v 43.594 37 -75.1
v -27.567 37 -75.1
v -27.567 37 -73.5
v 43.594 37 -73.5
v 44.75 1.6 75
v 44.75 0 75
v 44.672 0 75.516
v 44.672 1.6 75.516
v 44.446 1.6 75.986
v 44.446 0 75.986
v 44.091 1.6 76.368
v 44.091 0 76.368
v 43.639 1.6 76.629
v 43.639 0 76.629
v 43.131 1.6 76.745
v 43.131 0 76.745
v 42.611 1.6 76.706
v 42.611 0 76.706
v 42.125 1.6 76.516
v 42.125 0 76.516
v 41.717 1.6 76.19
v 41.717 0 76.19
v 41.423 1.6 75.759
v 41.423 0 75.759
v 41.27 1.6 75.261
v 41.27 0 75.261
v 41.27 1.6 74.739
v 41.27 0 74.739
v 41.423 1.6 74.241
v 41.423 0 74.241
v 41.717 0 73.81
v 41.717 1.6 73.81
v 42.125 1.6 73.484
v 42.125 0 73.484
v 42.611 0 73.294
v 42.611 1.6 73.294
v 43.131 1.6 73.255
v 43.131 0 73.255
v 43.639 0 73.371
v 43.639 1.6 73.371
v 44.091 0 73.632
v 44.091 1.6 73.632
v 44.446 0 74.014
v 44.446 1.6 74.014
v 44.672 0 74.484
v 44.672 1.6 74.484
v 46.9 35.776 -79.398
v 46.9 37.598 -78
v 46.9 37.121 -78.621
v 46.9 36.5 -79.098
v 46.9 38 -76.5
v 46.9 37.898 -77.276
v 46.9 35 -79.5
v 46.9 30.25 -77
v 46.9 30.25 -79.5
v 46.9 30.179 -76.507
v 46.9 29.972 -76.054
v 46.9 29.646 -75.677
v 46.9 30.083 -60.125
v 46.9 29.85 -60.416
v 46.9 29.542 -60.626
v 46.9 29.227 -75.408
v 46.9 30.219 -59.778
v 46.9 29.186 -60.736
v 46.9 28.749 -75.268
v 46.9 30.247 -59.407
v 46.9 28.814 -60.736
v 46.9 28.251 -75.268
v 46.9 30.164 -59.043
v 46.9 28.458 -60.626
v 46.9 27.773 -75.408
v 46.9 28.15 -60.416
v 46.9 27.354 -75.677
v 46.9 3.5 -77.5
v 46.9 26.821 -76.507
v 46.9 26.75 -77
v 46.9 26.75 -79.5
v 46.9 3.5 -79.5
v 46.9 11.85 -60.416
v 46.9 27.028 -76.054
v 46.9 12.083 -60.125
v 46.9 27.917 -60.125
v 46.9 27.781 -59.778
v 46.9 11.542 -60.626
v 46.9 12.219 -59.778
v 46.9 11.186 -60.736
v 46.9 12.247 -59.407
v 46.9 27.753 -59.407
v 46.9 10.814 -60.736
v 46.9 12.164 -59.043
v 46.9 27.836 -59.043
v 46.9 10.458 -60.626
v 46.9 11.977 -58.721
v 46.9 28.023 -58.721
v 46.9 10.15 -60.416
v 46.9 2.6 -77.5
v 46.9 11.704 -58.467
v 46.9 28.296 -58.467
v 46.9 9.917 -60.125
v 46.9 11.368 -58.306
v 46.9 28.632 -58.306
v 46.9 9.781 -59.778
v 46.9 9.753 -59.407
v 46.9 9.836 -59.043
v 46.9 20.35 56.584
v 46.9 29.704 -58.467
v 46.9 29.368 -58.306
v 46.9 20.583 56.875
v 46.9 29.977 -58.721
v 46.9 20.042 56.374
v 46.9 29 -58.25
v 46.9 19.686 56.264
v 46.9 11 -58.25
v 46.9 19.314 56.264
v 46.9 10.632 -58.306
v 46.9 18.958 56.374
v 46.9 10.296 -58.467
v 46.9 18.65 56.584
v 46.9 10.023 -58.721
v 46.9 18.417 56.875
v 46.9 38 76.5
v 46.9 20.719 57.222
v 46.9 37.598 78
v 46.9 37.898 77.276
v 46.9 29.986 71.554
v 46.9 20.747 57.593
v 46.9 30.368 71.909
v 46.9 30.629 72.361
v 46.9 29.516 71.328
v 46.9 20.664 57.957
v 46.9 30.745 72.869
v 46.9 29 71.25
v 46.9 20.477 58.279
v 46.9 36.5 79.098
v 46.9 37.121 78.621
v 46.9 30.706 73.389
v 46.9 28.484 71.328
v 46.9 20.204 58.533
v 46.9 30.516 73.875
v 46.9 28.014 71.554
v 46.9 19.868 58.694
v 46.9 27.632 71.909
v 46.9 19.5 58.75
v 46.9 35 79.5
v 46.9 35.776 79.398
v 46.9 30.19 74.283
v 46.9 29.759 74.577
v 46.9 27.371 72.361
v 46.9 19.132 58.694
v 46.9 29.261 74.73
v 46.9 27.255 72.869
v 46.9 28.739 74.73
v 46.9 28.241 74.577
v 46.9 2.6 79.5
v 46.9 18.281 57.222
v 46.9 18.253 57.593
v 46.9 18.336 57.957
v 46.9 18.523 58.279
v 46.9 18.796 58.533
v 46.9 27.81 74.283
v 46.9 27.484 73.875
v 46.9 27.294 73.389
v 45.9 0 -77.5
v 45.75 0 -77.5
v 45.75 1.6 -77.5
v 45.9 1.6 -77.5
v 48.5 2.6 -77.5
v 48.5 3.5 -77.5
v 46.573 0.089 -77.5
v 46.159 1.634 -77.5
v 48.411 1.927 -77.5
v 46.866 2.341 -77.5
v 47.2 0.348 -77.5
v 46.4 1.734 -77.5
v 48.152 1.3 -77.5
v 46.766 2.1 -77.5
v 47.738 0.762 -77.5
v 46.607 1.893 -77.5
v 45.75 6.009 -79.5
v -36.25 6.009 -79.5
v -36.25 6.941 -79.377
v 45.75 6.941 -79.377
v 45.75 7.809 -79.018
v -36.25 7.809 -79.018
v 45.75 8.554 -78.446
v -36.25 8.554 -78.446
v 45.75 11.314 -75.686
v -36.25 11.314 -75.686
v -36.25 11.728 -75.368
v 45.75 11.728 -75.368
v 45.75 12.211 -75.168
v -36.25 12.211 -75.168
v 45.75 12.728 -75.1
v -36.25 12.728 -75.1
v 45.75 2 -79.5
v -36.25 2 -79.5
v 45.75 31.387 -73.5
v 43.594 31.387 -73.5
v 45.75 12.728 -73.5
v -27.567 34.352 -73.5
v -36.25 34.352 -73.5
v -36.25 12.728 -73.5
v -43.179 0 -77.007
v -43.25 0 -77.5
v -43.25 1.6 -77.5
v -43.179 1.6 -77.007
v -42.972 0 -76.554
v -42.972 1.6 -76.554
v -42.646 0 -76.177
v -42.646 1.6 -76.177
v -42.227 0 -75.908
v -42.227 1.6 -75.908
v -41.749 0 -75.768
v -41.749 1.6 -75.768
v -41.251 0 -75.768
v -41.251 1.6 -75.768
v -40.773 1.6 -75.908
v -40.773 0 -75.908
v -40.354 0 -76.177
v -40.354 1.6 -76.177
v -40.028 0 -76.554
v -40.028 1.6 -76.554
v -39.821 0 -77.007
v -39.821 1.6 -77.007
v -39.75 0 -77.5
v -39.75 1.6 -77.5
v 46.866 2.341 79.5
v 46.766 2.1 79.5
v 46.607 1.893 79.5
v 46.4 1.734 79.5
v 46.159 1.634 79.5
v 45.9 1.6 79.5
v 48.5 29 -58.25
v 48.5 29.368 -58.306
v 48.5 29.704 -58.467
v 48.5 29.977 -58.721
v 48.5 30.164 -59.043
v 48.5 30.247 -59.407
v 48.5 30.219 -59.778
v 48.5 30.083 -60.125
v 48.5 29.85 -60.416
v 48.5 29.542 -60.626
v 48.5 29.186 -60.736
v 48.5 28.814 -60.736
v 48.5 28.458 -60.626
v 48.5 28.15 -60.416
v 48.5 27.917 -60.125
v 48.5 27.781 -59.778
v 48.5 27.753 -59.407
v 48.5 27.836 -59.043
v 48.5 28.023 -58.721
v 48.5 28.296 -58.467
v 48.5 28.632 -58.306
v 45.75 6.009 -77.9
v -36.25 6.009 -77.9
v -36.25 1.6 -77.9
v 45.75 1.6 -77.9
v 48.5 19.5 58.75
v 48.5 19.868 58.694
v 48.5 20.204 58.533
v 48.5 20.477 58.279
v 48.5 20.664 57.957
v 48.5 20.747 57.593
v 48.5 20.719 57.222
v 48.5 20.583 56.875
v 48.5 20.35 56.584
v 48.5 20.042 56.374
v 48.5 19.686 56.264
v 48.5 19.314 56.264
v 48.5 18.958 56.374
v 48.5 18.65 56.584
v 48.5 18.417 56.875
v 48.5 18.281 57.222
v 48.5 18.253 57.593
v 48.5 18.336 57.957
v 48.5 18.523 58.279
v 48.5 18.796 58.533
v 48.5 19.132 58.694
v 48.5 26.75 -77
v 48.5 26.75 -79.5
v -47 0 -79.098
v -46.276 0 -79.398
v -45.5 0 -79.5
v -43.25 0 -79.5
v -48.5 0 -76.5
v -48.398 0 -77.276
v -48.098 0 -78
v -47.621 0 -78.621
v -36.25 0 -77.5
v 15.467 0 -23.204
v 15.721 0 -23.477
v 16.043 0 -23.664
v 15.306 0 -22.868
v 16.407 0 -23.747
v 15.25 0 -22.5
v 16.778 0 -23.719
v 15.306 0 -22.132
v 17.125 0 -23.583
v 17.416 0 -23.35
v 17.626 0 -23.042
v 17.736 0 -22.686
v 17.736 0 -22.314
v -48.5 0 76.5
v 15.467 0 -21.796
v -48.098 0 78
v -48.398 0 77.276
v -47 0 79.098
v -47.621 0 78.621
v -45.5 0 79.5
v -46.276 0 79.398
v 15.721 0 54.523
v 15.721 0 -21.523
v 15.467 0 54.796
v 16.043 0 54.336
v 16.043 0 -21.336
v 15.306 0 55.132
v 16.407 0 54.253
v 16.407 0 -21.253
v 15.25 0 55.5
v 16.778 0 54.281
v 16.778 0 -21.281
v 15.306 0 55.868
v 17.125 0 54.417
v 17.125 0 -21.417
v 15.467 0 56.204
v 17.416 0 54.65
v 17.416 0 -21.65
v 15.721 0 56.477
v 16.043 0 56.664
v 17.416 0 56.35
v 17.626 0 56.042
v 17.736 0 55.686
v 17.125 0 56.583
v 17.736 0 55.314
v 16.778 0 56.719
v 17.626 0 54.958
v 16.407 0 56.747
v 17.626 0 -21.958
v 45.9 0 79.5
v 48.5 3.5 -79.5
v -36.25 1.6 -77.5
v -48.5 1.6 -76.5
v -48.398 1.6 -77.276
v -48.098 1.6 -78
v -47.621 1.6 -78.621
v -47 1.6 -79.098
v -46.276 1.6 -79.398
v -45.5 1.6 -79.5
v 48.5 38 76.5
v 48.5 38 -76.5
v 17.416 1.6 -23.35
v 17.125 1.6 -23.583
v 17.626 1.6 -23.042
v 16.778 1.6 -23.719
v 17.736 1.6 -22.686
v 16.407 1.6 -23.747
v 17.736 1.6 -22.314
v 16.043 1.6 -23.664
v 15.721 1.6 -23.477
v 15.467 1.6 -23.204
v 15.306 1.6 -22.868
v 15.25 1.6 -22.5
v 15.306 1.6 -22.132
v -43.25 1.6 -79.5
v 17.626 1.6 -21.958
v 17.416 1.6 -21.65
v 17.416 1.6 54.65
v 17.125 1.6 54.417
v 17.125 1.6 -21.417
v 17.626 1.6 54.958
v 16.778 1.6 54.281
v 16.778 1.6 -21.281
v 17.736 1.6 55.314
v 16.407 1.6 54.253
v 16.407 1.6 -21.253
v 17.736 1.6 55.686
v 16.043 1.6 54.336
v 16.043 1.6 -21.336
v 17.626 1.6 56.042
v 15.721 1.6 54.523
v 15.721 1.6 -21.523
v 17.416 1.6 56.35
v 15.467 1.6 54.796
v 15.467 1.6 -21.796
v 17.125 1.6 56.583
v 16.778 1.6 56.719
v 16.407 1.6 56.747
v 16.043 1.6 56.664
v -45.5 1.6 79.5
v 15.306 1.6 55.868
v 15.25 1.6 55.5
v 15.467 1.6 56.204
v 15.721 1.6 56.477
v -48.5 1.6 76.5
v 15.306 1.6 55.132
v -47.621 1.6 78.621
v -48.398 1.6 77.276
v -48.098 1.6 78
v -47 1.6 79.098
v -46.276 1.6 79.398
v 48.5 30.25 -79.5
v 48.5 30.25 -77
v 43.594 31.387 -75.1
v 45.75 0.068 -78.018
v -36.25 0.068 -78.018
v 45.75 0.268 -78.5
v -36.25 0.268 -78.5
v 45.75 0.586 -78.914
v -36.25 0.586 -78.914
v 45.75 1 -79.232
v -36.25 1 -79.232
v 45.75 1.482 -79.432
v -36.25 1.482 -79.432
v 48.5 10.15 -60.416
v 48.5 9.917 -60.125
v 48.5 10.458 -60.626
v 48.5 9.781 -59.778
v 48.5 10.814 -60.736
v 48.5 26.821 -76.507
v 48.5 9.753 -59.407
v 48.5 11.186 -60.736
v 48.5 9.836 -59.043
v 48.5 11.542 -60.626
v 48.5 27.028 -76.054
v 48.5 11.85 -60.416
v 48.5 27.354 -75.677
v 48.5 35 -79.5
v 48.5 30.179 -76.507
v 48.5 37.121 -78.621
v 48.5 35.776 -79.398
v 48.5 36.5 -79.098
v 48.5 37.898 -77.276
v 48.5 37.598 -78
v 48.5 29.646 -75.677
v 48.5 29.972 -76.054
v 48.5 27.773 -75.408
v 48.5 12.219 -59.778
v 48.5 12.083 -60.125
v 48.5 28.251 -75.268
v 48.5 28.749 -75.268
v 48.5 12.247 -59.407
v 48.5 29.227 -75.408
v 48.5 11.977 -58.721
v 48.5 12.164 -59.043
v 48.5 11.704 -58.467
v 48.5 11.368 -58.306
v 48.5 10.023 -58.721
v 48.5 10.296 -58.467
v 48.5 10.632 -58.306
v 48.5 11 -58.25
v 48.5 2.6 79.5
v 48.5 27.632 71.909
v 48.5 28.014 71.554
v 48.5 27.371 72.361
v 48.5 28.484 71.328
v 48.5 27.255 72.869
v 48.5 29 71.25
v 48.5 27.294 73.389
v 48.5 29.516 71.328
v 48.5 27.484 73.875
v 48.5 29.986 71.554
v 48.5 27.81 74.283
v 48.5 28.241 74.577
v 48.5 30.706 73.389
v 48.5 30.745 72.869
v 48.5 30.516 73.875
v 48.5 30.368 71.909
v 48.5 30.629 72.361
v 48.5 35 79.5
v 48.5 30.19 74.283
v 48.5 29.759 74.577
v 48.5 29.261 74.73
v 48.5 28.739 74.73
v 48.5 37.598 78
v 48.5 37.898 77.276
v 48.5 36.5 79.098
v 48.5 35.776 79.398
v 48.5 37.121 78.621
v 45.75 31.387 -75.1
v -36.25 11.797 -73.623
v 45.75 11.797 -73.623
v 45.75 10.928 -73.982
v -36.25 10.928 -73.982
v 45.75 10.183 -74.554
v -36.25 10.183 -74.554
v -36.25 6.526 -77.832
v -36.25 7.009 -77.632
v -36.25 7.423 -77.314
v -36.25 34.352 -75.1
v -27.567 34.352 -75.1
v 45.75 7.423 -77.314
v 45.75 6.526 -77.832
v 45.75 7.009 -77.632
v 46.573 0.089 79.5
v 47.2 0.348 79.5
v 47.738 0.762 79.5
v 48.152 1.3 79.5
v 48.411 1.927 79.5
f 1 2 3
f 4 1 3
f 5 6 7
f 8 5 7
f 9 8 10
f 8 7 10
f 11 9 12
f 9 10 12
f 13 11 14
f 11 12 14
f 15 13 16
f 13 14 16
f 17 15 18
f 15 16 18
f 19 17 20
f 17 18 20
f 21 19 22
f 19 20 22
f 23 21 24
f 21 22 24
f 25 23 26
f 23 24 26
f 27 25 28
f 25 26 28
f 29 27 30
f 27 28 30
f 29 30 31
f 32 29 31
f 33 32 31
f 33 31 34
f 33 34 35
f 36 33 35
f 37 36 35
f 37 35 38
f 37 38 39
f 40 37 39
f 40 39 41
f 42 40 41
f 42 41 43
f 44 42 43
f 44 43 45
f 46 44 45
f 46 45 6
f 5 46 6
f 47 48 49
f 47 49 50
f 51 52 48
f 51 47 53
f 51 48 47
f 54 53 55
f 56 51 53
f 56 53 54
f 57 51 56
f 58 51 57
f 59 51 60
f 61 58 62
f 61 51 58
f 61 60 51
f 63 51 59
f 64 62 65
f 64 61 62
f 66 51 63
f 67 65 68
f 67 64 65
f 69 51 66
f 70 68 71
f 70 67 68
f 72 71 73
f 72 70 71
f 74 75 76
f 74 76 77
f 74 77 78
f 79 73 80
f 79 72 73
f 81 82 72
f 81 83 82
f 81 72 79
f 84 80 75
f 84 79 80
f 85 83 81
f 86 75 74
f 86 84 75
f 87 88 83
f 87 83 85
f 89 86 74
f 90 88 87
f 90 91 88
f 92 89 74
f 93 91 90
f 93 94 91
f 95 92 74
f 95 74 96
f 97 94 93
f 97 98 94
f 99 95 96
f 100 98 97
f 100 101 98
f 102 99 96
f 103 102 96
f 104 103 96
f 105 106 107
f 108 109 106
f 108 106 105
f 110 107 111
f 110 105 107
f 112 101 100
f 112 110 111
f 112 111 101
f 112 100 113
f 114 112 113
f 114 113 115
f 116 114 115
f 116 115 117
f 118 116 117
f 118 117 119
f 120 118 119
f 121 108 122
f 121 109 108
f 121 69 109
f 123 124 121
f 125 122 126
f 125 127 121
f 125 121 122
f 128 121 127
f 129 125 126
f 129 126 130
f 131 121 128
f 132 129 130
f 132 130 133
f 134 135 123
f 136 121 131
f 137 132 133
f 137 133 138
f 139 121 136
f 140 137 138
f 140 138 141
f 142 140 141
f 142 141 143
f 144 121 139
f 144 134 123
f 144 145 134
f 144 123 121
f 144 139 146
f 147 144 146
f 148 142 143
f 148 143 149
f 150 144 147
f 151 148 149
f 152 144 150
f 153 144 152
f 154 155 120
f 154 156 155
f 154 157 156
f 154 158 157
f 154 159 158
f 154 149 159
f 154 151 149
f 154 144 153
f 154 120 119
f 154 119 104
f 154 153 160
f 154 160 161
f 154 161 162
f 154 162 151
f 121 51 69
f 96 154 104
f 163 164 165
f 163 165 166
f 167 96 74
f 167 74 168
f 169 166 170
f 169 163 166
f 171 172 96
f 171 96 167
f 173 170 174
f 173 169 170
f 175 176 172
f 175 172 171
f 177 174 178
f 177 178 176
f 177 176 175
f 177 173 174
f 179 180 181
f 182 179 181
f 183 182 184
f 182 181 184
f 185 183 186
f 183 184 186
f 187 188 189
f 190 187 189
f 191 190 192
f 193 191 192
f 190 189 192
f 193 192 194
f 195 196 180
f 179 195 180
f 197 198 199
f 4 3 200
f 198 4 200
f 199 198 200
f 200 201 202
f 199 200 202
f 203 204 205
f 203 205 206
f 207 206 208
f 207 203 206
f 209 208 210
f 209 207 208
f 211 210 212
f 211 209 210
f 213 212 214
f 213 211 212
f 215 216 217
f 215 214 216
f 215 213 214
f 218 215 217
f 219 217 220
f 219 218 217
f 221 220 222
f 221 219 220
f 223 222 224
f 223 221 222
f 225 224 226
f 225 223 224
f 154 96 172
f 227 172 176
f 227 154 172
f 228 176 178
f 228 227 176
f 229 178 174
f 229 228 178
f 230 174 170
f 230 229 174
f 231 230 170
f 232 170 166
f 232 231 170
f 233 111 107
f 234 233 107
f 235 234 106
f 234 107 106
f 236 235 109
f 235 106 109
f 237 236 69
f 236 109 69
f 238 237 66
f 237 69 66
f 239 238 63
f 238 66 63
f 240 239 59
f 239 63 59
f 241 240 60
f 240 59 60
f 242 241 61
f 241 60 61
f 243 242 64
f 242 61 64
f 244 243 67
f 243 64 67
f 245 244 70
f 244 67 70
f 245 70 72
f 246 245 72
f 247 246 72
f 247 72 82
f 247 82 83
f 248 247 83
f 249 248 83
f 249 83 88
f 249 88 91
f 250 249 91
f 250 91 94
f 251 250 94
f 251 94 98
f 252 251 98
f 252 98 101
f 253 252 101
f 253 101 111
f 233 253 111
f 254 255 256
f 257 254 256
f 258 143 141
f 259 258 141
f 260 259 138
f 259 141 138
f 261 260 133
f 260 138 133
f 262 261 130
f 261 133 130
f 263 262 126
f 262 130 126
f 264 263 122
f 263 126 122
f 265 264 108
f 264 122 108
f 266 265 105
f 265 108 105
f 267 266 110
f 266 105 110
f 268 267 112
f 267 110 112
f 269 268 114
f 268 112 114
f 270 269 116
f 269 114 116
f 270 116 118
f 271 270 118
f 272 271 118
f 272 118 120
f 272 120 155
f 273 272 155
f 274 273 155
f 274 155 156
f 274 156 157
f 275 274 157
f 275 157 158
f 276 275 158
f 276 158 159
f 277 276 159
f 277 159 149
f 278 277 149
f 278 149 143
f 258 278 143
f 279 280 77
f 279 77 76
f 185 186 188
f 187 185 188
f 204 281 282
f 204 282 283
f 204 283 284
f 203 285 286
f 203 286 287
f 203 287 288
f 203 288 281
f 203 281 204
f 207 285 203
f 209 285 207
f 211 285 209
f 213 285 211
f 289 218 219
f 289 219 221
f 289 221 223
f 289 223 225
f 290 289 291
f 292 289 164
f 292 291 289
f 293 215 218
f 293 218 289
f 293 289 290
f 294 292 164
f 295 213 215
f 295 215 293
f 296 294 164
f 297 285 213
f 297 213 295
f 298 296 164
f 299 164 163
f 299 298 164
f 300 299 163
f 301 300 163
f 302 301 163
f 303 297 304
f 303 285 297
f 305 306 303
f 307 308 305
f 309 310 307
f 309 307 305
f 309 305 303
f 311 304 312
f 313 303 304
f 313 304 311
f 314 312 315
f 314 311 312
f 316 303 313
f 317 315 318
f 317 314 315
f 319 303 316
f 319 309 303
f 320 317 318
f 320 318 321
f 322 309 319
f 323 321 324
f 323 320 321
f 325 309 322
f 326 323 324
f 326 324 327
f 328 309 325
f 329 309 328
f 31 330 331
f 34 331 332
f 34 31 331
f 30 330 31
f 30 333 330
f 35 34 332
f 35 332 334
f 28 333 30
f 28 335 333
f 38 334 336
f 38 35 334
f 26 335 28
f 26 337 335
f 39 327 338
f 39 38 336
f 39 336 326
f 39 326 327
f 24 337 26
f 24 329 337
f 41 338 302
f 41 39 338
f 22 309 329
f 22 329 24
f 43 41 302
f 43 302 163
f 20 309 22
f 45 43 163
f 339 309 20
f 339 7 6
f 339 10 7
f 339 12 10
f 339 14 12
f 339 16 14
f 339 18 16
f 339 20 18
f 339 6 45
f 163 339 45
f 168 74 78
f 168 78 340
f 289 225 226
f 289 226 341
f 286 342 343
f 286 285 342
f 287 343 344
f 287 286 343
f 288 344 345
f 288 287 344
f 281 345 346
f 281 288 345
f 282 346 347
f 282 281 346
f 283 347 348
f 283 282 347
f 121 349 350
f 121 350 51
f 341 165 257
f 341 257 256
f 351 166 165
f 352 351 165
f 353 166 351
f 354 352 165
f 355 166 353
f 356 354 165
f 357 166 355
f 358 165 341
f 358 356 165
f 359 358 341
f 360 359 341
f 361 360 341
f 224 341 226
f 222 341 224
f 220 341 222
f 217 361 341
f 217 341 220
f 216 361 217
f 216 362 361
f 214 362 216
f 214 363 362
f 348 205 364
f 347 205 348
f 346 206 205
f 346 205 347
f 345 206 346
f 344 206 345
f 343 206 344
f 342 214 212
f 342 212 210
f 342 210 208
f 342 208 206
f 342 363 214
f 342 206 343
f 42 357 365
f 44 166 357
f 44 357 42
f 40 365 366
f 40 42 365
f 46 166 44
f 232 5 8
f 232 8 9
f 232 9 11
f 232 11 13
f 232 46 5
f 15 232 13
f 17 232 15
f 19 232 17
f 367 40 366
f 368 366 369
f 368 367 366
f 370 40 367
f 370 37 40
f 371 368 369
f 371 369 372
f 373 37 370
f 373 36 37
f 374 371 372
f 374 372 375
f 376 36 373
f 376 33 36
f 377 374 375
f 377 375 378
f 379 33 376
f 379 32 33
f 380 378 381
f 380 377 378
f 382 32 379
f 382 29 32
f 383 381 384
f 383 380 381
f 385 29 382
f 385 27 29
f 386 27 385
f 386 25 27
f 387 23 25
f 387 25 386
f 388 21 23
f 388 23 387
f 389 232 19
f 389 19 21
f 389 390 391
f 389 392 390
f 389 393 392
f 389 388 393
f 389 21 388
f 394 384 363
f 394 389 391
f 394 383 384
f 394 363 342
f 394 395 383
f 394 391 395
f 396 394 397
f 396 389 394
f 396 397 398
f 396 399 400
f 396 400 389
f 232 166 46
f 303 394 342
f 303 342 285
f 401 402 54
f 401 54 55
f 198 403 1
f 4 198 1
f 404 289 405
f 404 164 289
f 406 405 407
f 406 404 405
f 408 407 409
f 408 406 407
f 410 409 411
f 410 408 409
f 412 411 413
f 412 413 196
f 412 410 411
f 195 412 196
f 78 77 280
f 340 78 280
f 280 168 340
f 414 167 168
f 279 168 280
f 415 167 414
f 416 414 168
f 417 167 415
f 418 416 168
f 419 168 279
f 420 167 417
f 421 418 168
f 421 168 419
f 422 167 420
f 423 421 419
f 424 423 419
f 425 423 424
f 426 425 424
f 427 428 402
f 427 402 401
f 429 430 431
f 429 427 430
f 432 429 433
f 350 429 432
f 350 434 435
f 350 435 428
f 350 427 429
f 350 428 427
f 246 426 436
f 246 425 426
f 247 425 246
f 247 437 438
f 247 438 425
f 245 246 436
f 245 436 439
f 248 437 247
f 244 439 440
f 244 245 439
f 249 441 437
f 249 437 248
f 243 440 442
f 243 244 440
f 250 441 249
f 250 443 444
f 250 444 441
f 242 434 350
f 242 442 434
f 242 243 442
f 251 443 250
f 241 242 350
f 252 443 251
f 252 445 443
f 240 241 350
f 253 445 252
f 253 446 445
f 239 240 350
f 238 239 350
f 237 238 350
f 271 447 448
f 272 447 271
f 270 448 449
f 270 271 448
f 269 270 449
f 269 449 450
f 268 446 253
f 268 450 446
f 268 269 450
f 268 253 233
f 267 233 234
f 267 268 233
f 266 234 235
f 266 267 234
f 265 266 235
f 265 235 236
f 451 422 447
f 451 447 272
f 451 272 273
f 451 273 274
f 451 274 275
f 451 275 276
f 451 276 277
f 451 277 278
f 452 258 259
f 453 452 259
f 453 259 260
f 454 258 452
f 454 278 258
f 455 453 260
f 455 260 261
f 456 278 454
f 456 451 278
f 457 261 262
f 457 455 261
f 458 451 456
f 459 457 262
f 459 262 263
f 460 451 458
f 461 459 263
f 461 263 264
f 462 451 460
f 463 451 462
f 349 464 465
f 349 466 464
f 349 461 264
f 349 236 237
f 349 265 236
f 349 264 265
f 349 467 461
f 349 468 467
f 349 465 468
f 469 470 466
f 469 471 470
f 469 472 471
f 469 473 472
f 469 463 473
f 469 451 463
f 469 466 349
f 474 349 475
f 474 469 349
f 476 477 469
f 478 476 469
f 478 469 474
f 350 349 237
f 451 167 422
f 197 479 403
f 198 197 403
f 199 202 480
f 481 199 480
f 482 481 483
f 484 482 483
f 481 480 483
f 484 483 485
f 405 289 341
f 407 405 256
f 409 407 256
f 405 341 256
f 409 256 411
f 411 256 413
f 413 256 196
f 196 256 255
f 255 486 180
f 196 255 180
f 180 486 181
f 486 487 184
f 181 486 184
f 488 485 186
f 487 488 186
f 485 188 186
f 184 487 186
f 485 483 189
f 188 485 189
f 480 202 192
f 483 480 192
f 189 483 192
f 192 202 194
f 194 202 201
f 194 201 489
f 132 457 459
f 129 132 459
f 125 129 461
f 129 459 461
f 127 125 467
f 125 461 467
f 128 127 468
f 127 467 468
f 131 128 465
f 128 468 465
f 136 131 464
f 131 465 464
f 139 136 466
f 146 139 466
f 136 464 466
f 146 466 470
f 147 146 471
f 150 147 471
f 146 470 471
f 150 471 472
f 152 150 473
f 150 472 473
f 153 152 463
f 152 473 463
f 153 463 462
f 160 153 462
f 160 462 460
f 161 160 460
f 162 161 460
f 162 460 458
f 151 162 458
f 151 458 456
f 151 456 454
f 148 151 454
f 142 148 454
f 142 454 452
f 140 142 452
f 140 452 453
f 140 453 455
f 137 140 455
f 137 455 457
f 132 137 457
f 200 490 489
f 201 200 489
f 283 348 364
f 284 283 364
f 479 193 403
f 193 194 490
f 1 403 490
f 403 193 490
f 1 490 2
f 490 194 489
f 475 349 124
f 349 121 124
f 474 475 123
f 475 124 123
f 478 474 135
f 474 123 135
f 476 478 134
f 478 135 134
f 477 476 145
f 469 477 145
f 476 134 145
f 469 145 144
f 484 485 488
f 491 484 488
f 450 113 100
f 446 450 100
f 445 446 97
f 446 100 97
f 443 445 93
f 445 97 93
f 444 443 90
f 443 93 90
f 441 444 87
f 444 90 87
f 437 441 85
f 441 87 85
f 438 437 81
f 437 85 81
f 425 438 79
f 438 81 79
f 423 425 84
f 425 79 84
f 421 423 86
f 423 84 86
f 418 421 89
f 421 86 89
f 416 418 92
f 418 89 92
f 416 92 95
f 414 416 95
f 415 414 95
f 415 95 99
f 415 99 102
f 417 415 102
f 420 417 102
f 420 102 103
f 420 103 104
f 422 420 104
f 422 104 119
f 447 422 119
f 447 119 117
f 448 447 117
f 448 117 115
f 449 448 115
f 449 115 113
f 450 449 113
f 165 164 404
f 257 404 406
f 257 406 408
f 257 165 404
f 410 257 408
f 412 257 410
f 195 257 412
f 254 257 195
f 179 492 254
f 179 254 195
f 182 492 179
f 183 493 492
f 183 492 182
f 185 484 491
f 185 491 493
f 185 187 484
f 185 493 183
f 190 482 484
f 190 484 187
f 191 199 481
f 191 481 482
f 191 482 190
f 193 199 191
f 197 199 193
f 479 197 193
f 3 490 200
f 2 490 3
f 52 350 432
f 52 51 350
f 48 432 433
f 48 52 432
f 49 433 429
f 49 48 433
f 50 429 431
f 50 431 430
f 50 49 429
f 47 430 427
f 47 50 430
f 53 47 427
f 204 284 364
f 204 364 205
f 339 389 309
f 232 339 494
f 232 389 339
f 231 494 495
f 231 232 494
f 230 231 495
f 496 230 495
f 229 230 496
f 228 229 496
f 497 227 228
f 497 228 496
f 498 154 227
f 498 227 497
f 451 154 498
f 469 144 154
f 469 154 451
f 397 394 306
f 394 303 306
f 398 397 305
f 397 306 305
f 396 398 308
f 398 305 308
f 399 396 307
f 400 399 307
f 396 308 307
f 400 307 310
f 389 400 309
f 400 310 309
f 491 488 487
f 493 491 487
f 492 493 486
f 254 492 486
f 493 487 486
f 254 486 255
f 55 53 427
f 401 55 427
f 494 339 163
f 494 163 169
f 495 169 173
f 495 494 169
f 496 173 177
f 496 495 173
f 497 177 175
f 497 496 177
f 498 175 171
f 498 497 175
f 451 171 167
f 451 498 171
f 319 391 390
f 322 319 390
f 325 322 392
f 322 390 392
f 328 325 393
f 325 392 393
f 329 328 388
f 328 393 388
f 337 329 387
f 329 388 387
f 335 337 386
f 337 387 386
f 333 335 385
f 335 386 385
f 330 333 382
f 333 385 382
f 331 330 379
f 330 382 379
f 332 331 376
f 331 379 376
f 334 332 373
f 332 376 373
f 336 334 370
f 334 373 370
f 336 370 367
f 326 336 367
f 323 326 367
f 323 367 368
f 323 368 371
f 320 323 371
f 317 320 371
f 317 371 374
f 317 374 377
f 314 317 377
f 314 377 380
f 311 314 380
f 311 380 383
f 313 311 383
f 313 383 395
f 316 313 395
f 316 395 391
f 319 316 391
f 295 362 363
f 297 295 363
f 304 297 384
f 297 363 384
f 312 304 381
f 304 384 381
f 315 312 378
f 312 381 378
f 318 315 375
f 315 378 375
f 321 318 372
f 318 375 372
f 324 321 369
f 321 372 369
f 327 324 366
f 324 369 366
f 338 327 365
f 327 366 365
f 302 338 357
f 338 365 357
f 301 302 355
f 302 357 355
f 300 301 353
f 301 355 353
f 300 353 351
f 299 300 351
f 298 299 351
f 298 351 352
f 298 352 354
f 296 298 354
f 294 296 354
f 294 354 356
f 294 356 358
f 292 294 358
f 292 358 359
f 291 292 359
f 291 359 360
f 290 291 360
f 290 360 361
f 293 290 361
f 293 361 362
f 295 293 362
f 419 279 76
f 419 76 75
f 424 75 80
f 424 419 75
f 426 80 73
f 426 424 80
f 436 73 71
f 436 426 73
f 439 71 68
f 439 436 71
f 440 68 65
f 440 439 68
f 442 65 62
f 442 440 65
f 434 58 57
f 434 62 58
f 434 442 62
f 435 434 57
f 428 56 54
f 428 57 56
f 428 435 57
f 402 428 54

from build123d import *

# Parameters (mm, degrees)
EXTRUDE_THIN1_DEPTH        = 79.5
FILLET1_R                  = 3
EXTRUDE1_DEPTH             = 101.58081328
SKETCH4_W                  = 88.25
SKETCH4_H                  = 2
EXTRUDE2_DEPTH             = 3.5
EXTRUDE_THIN2_START        = -82
EXTRUDE_THIN2_DEPTH        = 82
FILLET2_R                  = 2
SKETCH6_W                  = 2.155687989
SKETCH6_H                  = 5.613141175
SKETCH6_W_2                = 8.683222246
SKETCH6_H_2                = 2.647575272
EXTRUDE3_DEPTH             = 167.425388688
F_3_5_3_5_DIAMETER_HOLE1_D = 3.5
SKETCH9_R                  = 1.75
EXTRUDE4_DEPTH             = 132.046747384
M3_TAPPED_HOLE1_D          = 2.5
M3_TAPPED_HOLE2_D          = 2.5


# Read off the part's stored shape, not the designer's step: Extrude-Thin2
with BuildPart() as part:
    # Sketch1 → Extrude-Thin1 (new, symmetric)
    with BuildSketch(Plane.XY):
        with BuildLine():
            Line((-48.5, 0), (45.9, 0))
            ThreePointArc((45.9, 0), (47.738477631, 0.761522369), (48.5, 2.6))
            Line((48.5, 2.6), (48.5, 38))
            Line((48.5, 38), (46.9, 38))
            Line((46.9, 38), (46.9, 2.6))
            ThreePointArc((46.9, 2.6), (46.607106781, 1.892893219), (45.9, 1.6))
            Line((45.9, 1.6), (-48.5, 1.6))
            Line((-48.5, 1.6), (-48.5, 0))
        make_face()
    extrude(amount=EXTRUDE_THIN1_DEPTH, both=True)

    # Fillet1
    fillet1_edges = [part.edges().sort_by_distance(p)[0] for p in [
        (-48.5, 0.8, 79.5),
        (47.7, 38, 79.5),
        (-48.5, 0.8, -79.5),
        (47.7, 38, -79.5),
    ]]
    fillet(fillet1_edges, radius=FILLET1_R)

    # Sketch3 → Extrude1 (cut, through all)
    with BuildSketch(Plane.XZ):
        with BuildLine():
            Line((-43.25, -81.5), (-43.25, -77.5))
            ThreePointArc((-43.25, -77.5), (-41.5, -75.75), (-39.75, -77.5))
            Line((-39.75, -77.5), (-39.75, -81.5))
            ThreePointArc((-39.75, -81.5), (-41.5, -83.25), (-43.25, -81.5))
        make_face()
    extrude(amount=-EXTRUDE1_DEPTH, mode=Mode.SUBTRACT)

    # Sketch4 → Extrude2 (cut)
    with BuildSketch(Plane.XZ):
        with Locations((4.375, -78.5)):
            Rectangle(SKETCH4_W, SKETCH4_H)
    extrude(amount=-EXTRUDE2_DEPTH, mode=Mode.SUBTRACT)

    # Extrude-Thin2 outline → Extrude-Thin2 (add)
    with BuildSketch(Plane(origin=(45.75, 0, 0), x_dir=(0, 0, -1), z_dir=(1, 0, 0)).offset(EXTRUDE_THIN2_START)):
        with BuildLine():
            Line((77.5, 0), (79.5, 0))
            Line((79.5, 0), (79.5, 6.008831175))
            ThreePointArc((79.5, 6.008831175), (79.225966317, 7.386491532), (78.445584412, 8.554415588))
            Line((78.445584412, 8.554415588), (75.685786438, 11.314213562))
            ThreePointArc((75.685786438, 11.314213562), (75.252240935, 11.96306026), (75.1, 12.728427125))
            Line((75.1, 12.728427125), (75.1, 37))
            Line((75.1, 37), (73.5, 37))
            Line((73.5, 37), (73.5, 12.728427125))
            ThreePointArc((73.5, 12.728427125), (73.774033683, 11.350766768), (74.554415588, 10.182842712))
            Line((74.554415588, 10.182842712), (77.314213562, 7.423044738))
            ThreePointArc((77.314213562, 7.423044738), (77.747759065, 6.77419804), (77.9, 6.008831175))
            Line((77.9, 6.008831175), (77.9, 1.6))
            Line((77.9, 1.6), (77.5, 1.6))
            Line((77.5, 1.6), (77.5, 0))
        make_face()
    extrude(amount=EXTRUDE_THIN2_DEPTH)

    # Fillet2
    fillet2_edges = [part.edges().sort_by_distance(p)[0] for p in [
        (4.75, 0, -79.5),
    ]]
    fillet(fillet2_edges, radius=FILLET2_R)

    # Sketch6 → Extrude3 (cut, through all)
    with BuildSketch(Plane(origin=(0, 0, -75.1), x_dir=(-1, 0, 0), z_dir=(0, 0, -1))):
        with Locations((-44.672156005, 34.193429413)):
            Rectangle(SKETCH6_W, SKETCH6_H)
        with Locations((31.908388877, 35.676212364)):
            Rectangle(SKETCH6_W_2, SKETCH6_H_2)
    extrude(amount=-EXTRUDE3_DEPTH, mode=Mode.SUBTRACT)

    # Ø3.5 (3.5) Diameter Hole1 (through all)
    with Locations(Plane(origin=(0, 1.6, 0), x_dir=(-1, 0, 0), z_dir=(0, 1, 0))):
        with Locations((-43, 75)):
            Hole(F_3_5_3_5_DIAMETER_HOLE1_D / 2)

    # Sketch9 → Extrude4 (cut, through all)
    with BuildSketch(Plane(origin=(48.5, 0, 0), x_dir=(0, 0, -1), z_dir=(1, 0, 0))):
        with Locations((-73, 29)):
            Circle(SKETCH9_R)
        with BuildLine():
            Line((82, 26.75), (77, 26.75))
            ThreePointArc((77, 26.75), (75.25, 28.5), (77, 30.25))
            Line((77, 30.25), (82, 30.25))
            ThreePointArc((82, 30.25), (83.75, 28.5), (82, 26.75))
        make_face()
    extrude(amount=-EXTRUDE4_DEPTH, mode=Mode.SUBTRACT)

    # M3 Tapped Hole1 (through all)
    with Locations(Plane(origin=(48.5, 0, 0), x_dir=(0, 0, -1), z_dir=(1, 0, 0))):
        with Locations((-57.5, 19.5), (59.5, 29), (59.5, 11)):
            Hole(M3_TAPPED_HOLE1_D / 2)

    # M3 Tapped Hole2 (through all)
    with Locations(Plane.XZ):
        with Locations((16.5, 55.5), (16.5, -22.5)):
            Hole(M3_TAPPED_HOLE2_D / 2)


solid = part.part
